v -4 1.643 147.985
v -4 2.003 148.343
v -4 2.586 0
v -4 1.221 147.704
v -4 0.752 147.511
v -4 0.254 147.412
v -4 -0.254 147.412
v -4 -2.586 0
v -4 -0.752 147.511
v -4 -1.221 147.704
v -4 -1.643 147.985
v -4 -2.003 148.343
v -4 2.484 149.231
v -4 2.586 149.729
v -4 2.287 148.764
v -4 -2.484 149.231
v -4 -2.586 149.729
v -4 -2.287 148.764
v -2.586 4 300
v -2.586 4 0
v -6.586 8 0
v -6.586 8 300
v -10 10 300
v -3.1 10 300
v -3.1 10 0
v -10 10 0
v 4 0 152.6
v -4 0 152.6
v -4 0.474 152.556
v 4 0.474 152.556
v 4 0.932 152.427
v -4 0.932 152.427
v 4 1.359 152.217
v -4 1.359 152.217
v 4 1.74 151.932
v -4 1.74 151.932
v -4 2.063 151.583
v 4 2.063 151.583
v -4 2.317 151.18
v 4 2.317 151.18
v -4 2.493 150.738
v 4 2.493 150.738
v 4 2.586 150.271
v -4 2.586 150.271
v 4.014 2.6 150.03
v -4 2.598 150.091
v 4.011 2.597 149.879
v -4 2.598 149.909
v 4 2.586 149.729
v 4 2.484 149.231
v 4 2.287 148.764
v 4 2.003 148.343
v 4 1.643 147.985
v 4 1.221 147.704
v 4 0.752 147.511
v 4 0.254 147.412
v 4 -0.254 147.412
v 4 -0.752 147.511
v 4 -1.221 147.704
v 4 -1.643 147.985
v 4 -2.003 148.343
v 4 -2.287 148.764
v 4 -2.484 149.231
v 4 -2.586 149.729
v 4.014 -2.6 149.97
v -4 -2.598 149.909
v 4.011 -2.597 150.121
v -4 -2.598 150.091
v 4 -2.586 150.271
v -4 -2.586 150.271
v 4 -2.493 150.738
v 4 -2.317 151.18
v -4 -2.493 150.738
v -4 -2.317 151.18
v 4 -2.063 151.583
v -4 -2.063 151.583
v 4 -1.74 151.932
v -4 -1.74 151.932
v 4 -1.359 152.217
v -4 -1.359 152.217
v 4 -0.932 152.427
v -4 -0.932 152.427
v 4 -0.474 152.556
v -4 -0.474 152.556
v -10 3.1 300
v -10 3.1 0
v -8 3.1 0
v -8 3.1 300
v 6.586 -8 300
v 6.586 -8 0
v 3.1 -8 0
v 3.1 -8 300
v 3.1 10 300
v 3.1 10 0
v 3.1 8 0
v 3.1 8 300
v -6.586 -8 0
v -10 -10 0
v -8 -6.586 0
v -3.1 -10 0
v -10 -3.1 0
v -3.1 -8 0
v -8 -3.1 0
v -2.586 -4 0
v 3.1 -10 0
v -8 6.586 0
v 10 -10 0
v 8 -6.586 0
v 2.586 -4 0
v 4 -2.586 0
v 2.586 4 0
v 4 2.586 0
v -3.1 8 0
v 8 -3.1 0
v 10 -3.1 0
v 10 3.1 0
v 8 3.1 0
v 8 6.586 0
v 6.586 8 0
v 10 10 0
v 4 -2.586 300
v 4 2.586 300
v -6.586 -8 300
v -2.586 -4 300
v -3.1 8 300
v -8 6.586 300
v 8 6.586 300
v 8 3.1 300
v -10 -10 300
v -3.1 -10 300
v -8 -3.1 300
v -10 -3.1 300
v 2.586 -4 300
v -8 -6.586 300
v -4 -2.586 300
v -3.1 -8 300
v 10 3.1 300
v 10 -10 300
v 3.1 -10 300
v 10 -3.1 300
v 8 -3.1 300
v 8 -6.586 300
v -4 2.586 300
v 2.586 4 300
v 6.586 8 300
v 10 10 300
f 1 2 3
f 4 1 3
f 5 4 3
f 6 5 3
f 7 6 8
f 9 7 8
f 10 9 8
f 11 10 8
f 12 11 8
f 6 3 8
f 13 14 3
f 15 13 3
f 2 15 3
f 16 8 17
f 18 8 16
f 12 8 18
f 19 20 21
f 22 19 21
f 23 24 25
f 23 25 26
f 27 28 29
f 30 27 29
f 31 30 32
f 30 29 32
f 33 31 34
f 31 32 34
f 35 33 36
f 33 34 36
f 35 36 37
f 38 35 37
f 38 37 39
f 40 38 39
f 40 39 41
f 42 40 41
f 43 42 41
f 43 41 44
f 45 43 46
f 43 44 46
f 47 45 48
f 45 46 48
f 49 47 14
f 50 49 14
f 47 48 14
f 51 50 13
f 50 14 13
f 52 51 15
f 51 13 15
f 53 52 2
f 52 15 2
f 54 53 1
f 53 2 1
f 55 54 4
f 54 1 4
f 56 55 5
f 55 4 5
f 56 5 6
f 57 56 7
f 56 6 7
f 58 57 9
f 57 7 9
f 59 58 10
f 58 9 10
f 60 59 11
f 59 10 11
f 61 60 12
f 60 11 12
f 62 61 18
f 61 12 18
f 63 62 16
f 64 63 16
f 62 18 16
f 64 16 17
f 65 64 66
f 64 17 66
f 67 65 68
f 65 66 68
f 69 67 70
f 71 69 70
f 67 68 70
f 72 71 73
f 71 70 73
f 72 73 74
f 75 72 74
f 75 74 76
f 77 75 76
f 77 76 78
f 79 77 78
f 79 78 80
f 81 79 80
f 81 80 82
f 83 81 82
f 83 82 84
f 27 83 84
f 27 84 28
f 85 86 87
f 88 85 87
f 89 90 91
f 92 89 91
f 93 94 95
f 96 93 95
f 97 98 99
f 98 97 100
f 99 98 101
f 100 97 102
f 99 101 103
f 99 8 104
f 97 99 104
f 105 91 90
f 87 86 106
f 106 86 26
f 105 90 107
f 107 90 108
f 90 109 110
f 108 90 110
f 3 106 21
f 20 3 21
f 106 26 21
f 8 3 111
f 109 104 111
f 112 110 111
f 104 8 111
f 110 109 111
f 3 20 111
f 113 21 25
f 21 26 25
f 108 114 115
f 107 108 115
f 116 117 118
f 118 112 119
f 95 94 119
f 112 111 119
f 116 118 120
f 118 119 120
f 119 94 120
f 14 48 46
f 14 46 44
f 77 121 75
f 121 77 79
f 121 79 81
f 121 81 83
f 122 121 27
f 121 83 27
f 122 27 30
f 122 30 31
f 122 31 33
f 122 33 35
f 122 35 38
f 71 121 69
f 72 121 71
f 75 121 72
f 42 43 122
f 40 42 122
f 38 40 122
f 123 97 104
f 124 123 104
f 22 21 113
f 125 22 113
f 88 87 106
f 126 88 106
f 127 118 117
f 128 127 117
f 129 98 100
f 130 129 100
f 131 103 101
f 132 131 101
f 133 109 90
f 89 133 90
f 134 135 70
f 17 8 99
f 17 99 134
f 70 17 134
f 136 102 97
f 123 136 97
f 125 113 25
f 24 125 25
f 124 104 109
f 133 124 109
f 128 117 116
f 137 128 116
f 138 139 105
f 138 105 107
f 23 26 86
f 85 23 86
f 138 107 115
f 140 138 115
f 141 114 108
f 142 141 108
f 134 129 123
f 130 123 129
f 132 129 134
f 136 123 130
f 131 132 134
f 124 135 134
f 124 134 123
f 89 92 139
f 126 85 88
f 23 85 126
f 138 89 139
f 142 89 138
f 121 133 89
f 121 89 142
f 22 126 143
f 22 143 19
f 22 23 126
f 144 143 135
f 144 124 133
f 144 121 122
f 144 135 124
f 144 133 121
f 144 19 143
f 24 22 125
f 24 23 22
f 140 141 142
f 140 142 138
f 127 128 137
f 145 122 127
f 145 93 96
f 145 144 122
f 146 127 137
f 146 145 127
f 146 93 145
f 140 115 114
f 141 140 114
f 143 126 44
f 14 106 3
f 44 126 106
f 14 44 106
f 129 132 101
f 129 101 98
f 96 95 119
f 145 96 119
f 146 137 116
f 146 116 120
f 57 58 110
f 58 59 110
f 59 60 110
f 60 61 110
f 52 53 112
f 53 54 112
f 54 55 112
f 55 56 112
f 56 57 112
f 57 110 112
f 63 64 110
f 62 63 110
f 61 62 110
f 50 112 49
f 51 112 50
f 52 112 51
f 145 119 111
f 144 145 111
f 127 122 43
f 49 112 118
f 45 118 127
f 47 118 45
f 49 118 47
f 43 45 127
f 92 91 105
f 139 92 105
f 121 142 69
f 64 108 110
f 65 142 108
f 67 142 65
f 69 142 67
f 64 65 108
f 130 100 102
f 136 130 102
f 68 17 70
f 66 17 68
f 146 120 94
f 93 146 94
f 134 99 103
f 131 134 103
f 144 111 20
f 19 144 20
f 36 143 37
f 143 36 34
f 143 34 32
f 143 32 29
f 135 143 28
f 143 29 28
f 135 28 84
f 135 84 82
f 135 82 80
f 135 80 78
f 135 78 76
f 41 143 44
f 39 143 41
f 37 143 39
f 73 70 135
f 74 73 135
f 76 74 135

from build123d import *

# Parameters (mm, degrees)
BOSS_EXTRUDE1_DEPTH = 300
SKETCH2_R           = 2.6
CUT_EXTRUDE1_DEPTH  = 15


with BuildPart() as part:
    # Sketch1 → Boss-Extrude1 (new body)
    with BuildSketch(Plane.XY):
        Polygon((-8, 6.585786438), (-4, 2.585786438), (-4, -2.585786438), (-8, -6.585786438), (-8, -3.1), (-10, -3.1), (-10, -10), (-3.1, -10), (-3.1, -8), (-6.585786438, -8), (-2.585786438, -4), (2.585786438, -4), (6.585786438, -8), (3.1, -8), (3.1, -10), (10, -10), (10, -3.1), (8, -3.1), (8, -6.585786438), (4, -2.585786438), (4, 2.585786438), (8, 6.585786438), (8, 3.1), (10, 3.1), (10, 10), (3.1, 10), (3.1, 8), (6.585786438, 8), (2.585786438, 4), (-2.585786438, 4), (-6.585786438, 8), (-3.1, 8), (-3.1, 10), (-10, 10), (-10, 3.1), (-8, 3.1), align=None)
    extrude(amount=BOSS_EXTRUDE1_DEPTH)

    # Sketch2 → Cut-Extrude1 (cut, through all)
    with BuildSketch(Plane.ZY.offset(4)):
        with Locations((150, 0)):
            Circle(SKETCH2_R)
    extrude(amount=-CUT_EXTRUDE1_DEPTH, mode=Mode.SUBTRACT)


solid = part.part
